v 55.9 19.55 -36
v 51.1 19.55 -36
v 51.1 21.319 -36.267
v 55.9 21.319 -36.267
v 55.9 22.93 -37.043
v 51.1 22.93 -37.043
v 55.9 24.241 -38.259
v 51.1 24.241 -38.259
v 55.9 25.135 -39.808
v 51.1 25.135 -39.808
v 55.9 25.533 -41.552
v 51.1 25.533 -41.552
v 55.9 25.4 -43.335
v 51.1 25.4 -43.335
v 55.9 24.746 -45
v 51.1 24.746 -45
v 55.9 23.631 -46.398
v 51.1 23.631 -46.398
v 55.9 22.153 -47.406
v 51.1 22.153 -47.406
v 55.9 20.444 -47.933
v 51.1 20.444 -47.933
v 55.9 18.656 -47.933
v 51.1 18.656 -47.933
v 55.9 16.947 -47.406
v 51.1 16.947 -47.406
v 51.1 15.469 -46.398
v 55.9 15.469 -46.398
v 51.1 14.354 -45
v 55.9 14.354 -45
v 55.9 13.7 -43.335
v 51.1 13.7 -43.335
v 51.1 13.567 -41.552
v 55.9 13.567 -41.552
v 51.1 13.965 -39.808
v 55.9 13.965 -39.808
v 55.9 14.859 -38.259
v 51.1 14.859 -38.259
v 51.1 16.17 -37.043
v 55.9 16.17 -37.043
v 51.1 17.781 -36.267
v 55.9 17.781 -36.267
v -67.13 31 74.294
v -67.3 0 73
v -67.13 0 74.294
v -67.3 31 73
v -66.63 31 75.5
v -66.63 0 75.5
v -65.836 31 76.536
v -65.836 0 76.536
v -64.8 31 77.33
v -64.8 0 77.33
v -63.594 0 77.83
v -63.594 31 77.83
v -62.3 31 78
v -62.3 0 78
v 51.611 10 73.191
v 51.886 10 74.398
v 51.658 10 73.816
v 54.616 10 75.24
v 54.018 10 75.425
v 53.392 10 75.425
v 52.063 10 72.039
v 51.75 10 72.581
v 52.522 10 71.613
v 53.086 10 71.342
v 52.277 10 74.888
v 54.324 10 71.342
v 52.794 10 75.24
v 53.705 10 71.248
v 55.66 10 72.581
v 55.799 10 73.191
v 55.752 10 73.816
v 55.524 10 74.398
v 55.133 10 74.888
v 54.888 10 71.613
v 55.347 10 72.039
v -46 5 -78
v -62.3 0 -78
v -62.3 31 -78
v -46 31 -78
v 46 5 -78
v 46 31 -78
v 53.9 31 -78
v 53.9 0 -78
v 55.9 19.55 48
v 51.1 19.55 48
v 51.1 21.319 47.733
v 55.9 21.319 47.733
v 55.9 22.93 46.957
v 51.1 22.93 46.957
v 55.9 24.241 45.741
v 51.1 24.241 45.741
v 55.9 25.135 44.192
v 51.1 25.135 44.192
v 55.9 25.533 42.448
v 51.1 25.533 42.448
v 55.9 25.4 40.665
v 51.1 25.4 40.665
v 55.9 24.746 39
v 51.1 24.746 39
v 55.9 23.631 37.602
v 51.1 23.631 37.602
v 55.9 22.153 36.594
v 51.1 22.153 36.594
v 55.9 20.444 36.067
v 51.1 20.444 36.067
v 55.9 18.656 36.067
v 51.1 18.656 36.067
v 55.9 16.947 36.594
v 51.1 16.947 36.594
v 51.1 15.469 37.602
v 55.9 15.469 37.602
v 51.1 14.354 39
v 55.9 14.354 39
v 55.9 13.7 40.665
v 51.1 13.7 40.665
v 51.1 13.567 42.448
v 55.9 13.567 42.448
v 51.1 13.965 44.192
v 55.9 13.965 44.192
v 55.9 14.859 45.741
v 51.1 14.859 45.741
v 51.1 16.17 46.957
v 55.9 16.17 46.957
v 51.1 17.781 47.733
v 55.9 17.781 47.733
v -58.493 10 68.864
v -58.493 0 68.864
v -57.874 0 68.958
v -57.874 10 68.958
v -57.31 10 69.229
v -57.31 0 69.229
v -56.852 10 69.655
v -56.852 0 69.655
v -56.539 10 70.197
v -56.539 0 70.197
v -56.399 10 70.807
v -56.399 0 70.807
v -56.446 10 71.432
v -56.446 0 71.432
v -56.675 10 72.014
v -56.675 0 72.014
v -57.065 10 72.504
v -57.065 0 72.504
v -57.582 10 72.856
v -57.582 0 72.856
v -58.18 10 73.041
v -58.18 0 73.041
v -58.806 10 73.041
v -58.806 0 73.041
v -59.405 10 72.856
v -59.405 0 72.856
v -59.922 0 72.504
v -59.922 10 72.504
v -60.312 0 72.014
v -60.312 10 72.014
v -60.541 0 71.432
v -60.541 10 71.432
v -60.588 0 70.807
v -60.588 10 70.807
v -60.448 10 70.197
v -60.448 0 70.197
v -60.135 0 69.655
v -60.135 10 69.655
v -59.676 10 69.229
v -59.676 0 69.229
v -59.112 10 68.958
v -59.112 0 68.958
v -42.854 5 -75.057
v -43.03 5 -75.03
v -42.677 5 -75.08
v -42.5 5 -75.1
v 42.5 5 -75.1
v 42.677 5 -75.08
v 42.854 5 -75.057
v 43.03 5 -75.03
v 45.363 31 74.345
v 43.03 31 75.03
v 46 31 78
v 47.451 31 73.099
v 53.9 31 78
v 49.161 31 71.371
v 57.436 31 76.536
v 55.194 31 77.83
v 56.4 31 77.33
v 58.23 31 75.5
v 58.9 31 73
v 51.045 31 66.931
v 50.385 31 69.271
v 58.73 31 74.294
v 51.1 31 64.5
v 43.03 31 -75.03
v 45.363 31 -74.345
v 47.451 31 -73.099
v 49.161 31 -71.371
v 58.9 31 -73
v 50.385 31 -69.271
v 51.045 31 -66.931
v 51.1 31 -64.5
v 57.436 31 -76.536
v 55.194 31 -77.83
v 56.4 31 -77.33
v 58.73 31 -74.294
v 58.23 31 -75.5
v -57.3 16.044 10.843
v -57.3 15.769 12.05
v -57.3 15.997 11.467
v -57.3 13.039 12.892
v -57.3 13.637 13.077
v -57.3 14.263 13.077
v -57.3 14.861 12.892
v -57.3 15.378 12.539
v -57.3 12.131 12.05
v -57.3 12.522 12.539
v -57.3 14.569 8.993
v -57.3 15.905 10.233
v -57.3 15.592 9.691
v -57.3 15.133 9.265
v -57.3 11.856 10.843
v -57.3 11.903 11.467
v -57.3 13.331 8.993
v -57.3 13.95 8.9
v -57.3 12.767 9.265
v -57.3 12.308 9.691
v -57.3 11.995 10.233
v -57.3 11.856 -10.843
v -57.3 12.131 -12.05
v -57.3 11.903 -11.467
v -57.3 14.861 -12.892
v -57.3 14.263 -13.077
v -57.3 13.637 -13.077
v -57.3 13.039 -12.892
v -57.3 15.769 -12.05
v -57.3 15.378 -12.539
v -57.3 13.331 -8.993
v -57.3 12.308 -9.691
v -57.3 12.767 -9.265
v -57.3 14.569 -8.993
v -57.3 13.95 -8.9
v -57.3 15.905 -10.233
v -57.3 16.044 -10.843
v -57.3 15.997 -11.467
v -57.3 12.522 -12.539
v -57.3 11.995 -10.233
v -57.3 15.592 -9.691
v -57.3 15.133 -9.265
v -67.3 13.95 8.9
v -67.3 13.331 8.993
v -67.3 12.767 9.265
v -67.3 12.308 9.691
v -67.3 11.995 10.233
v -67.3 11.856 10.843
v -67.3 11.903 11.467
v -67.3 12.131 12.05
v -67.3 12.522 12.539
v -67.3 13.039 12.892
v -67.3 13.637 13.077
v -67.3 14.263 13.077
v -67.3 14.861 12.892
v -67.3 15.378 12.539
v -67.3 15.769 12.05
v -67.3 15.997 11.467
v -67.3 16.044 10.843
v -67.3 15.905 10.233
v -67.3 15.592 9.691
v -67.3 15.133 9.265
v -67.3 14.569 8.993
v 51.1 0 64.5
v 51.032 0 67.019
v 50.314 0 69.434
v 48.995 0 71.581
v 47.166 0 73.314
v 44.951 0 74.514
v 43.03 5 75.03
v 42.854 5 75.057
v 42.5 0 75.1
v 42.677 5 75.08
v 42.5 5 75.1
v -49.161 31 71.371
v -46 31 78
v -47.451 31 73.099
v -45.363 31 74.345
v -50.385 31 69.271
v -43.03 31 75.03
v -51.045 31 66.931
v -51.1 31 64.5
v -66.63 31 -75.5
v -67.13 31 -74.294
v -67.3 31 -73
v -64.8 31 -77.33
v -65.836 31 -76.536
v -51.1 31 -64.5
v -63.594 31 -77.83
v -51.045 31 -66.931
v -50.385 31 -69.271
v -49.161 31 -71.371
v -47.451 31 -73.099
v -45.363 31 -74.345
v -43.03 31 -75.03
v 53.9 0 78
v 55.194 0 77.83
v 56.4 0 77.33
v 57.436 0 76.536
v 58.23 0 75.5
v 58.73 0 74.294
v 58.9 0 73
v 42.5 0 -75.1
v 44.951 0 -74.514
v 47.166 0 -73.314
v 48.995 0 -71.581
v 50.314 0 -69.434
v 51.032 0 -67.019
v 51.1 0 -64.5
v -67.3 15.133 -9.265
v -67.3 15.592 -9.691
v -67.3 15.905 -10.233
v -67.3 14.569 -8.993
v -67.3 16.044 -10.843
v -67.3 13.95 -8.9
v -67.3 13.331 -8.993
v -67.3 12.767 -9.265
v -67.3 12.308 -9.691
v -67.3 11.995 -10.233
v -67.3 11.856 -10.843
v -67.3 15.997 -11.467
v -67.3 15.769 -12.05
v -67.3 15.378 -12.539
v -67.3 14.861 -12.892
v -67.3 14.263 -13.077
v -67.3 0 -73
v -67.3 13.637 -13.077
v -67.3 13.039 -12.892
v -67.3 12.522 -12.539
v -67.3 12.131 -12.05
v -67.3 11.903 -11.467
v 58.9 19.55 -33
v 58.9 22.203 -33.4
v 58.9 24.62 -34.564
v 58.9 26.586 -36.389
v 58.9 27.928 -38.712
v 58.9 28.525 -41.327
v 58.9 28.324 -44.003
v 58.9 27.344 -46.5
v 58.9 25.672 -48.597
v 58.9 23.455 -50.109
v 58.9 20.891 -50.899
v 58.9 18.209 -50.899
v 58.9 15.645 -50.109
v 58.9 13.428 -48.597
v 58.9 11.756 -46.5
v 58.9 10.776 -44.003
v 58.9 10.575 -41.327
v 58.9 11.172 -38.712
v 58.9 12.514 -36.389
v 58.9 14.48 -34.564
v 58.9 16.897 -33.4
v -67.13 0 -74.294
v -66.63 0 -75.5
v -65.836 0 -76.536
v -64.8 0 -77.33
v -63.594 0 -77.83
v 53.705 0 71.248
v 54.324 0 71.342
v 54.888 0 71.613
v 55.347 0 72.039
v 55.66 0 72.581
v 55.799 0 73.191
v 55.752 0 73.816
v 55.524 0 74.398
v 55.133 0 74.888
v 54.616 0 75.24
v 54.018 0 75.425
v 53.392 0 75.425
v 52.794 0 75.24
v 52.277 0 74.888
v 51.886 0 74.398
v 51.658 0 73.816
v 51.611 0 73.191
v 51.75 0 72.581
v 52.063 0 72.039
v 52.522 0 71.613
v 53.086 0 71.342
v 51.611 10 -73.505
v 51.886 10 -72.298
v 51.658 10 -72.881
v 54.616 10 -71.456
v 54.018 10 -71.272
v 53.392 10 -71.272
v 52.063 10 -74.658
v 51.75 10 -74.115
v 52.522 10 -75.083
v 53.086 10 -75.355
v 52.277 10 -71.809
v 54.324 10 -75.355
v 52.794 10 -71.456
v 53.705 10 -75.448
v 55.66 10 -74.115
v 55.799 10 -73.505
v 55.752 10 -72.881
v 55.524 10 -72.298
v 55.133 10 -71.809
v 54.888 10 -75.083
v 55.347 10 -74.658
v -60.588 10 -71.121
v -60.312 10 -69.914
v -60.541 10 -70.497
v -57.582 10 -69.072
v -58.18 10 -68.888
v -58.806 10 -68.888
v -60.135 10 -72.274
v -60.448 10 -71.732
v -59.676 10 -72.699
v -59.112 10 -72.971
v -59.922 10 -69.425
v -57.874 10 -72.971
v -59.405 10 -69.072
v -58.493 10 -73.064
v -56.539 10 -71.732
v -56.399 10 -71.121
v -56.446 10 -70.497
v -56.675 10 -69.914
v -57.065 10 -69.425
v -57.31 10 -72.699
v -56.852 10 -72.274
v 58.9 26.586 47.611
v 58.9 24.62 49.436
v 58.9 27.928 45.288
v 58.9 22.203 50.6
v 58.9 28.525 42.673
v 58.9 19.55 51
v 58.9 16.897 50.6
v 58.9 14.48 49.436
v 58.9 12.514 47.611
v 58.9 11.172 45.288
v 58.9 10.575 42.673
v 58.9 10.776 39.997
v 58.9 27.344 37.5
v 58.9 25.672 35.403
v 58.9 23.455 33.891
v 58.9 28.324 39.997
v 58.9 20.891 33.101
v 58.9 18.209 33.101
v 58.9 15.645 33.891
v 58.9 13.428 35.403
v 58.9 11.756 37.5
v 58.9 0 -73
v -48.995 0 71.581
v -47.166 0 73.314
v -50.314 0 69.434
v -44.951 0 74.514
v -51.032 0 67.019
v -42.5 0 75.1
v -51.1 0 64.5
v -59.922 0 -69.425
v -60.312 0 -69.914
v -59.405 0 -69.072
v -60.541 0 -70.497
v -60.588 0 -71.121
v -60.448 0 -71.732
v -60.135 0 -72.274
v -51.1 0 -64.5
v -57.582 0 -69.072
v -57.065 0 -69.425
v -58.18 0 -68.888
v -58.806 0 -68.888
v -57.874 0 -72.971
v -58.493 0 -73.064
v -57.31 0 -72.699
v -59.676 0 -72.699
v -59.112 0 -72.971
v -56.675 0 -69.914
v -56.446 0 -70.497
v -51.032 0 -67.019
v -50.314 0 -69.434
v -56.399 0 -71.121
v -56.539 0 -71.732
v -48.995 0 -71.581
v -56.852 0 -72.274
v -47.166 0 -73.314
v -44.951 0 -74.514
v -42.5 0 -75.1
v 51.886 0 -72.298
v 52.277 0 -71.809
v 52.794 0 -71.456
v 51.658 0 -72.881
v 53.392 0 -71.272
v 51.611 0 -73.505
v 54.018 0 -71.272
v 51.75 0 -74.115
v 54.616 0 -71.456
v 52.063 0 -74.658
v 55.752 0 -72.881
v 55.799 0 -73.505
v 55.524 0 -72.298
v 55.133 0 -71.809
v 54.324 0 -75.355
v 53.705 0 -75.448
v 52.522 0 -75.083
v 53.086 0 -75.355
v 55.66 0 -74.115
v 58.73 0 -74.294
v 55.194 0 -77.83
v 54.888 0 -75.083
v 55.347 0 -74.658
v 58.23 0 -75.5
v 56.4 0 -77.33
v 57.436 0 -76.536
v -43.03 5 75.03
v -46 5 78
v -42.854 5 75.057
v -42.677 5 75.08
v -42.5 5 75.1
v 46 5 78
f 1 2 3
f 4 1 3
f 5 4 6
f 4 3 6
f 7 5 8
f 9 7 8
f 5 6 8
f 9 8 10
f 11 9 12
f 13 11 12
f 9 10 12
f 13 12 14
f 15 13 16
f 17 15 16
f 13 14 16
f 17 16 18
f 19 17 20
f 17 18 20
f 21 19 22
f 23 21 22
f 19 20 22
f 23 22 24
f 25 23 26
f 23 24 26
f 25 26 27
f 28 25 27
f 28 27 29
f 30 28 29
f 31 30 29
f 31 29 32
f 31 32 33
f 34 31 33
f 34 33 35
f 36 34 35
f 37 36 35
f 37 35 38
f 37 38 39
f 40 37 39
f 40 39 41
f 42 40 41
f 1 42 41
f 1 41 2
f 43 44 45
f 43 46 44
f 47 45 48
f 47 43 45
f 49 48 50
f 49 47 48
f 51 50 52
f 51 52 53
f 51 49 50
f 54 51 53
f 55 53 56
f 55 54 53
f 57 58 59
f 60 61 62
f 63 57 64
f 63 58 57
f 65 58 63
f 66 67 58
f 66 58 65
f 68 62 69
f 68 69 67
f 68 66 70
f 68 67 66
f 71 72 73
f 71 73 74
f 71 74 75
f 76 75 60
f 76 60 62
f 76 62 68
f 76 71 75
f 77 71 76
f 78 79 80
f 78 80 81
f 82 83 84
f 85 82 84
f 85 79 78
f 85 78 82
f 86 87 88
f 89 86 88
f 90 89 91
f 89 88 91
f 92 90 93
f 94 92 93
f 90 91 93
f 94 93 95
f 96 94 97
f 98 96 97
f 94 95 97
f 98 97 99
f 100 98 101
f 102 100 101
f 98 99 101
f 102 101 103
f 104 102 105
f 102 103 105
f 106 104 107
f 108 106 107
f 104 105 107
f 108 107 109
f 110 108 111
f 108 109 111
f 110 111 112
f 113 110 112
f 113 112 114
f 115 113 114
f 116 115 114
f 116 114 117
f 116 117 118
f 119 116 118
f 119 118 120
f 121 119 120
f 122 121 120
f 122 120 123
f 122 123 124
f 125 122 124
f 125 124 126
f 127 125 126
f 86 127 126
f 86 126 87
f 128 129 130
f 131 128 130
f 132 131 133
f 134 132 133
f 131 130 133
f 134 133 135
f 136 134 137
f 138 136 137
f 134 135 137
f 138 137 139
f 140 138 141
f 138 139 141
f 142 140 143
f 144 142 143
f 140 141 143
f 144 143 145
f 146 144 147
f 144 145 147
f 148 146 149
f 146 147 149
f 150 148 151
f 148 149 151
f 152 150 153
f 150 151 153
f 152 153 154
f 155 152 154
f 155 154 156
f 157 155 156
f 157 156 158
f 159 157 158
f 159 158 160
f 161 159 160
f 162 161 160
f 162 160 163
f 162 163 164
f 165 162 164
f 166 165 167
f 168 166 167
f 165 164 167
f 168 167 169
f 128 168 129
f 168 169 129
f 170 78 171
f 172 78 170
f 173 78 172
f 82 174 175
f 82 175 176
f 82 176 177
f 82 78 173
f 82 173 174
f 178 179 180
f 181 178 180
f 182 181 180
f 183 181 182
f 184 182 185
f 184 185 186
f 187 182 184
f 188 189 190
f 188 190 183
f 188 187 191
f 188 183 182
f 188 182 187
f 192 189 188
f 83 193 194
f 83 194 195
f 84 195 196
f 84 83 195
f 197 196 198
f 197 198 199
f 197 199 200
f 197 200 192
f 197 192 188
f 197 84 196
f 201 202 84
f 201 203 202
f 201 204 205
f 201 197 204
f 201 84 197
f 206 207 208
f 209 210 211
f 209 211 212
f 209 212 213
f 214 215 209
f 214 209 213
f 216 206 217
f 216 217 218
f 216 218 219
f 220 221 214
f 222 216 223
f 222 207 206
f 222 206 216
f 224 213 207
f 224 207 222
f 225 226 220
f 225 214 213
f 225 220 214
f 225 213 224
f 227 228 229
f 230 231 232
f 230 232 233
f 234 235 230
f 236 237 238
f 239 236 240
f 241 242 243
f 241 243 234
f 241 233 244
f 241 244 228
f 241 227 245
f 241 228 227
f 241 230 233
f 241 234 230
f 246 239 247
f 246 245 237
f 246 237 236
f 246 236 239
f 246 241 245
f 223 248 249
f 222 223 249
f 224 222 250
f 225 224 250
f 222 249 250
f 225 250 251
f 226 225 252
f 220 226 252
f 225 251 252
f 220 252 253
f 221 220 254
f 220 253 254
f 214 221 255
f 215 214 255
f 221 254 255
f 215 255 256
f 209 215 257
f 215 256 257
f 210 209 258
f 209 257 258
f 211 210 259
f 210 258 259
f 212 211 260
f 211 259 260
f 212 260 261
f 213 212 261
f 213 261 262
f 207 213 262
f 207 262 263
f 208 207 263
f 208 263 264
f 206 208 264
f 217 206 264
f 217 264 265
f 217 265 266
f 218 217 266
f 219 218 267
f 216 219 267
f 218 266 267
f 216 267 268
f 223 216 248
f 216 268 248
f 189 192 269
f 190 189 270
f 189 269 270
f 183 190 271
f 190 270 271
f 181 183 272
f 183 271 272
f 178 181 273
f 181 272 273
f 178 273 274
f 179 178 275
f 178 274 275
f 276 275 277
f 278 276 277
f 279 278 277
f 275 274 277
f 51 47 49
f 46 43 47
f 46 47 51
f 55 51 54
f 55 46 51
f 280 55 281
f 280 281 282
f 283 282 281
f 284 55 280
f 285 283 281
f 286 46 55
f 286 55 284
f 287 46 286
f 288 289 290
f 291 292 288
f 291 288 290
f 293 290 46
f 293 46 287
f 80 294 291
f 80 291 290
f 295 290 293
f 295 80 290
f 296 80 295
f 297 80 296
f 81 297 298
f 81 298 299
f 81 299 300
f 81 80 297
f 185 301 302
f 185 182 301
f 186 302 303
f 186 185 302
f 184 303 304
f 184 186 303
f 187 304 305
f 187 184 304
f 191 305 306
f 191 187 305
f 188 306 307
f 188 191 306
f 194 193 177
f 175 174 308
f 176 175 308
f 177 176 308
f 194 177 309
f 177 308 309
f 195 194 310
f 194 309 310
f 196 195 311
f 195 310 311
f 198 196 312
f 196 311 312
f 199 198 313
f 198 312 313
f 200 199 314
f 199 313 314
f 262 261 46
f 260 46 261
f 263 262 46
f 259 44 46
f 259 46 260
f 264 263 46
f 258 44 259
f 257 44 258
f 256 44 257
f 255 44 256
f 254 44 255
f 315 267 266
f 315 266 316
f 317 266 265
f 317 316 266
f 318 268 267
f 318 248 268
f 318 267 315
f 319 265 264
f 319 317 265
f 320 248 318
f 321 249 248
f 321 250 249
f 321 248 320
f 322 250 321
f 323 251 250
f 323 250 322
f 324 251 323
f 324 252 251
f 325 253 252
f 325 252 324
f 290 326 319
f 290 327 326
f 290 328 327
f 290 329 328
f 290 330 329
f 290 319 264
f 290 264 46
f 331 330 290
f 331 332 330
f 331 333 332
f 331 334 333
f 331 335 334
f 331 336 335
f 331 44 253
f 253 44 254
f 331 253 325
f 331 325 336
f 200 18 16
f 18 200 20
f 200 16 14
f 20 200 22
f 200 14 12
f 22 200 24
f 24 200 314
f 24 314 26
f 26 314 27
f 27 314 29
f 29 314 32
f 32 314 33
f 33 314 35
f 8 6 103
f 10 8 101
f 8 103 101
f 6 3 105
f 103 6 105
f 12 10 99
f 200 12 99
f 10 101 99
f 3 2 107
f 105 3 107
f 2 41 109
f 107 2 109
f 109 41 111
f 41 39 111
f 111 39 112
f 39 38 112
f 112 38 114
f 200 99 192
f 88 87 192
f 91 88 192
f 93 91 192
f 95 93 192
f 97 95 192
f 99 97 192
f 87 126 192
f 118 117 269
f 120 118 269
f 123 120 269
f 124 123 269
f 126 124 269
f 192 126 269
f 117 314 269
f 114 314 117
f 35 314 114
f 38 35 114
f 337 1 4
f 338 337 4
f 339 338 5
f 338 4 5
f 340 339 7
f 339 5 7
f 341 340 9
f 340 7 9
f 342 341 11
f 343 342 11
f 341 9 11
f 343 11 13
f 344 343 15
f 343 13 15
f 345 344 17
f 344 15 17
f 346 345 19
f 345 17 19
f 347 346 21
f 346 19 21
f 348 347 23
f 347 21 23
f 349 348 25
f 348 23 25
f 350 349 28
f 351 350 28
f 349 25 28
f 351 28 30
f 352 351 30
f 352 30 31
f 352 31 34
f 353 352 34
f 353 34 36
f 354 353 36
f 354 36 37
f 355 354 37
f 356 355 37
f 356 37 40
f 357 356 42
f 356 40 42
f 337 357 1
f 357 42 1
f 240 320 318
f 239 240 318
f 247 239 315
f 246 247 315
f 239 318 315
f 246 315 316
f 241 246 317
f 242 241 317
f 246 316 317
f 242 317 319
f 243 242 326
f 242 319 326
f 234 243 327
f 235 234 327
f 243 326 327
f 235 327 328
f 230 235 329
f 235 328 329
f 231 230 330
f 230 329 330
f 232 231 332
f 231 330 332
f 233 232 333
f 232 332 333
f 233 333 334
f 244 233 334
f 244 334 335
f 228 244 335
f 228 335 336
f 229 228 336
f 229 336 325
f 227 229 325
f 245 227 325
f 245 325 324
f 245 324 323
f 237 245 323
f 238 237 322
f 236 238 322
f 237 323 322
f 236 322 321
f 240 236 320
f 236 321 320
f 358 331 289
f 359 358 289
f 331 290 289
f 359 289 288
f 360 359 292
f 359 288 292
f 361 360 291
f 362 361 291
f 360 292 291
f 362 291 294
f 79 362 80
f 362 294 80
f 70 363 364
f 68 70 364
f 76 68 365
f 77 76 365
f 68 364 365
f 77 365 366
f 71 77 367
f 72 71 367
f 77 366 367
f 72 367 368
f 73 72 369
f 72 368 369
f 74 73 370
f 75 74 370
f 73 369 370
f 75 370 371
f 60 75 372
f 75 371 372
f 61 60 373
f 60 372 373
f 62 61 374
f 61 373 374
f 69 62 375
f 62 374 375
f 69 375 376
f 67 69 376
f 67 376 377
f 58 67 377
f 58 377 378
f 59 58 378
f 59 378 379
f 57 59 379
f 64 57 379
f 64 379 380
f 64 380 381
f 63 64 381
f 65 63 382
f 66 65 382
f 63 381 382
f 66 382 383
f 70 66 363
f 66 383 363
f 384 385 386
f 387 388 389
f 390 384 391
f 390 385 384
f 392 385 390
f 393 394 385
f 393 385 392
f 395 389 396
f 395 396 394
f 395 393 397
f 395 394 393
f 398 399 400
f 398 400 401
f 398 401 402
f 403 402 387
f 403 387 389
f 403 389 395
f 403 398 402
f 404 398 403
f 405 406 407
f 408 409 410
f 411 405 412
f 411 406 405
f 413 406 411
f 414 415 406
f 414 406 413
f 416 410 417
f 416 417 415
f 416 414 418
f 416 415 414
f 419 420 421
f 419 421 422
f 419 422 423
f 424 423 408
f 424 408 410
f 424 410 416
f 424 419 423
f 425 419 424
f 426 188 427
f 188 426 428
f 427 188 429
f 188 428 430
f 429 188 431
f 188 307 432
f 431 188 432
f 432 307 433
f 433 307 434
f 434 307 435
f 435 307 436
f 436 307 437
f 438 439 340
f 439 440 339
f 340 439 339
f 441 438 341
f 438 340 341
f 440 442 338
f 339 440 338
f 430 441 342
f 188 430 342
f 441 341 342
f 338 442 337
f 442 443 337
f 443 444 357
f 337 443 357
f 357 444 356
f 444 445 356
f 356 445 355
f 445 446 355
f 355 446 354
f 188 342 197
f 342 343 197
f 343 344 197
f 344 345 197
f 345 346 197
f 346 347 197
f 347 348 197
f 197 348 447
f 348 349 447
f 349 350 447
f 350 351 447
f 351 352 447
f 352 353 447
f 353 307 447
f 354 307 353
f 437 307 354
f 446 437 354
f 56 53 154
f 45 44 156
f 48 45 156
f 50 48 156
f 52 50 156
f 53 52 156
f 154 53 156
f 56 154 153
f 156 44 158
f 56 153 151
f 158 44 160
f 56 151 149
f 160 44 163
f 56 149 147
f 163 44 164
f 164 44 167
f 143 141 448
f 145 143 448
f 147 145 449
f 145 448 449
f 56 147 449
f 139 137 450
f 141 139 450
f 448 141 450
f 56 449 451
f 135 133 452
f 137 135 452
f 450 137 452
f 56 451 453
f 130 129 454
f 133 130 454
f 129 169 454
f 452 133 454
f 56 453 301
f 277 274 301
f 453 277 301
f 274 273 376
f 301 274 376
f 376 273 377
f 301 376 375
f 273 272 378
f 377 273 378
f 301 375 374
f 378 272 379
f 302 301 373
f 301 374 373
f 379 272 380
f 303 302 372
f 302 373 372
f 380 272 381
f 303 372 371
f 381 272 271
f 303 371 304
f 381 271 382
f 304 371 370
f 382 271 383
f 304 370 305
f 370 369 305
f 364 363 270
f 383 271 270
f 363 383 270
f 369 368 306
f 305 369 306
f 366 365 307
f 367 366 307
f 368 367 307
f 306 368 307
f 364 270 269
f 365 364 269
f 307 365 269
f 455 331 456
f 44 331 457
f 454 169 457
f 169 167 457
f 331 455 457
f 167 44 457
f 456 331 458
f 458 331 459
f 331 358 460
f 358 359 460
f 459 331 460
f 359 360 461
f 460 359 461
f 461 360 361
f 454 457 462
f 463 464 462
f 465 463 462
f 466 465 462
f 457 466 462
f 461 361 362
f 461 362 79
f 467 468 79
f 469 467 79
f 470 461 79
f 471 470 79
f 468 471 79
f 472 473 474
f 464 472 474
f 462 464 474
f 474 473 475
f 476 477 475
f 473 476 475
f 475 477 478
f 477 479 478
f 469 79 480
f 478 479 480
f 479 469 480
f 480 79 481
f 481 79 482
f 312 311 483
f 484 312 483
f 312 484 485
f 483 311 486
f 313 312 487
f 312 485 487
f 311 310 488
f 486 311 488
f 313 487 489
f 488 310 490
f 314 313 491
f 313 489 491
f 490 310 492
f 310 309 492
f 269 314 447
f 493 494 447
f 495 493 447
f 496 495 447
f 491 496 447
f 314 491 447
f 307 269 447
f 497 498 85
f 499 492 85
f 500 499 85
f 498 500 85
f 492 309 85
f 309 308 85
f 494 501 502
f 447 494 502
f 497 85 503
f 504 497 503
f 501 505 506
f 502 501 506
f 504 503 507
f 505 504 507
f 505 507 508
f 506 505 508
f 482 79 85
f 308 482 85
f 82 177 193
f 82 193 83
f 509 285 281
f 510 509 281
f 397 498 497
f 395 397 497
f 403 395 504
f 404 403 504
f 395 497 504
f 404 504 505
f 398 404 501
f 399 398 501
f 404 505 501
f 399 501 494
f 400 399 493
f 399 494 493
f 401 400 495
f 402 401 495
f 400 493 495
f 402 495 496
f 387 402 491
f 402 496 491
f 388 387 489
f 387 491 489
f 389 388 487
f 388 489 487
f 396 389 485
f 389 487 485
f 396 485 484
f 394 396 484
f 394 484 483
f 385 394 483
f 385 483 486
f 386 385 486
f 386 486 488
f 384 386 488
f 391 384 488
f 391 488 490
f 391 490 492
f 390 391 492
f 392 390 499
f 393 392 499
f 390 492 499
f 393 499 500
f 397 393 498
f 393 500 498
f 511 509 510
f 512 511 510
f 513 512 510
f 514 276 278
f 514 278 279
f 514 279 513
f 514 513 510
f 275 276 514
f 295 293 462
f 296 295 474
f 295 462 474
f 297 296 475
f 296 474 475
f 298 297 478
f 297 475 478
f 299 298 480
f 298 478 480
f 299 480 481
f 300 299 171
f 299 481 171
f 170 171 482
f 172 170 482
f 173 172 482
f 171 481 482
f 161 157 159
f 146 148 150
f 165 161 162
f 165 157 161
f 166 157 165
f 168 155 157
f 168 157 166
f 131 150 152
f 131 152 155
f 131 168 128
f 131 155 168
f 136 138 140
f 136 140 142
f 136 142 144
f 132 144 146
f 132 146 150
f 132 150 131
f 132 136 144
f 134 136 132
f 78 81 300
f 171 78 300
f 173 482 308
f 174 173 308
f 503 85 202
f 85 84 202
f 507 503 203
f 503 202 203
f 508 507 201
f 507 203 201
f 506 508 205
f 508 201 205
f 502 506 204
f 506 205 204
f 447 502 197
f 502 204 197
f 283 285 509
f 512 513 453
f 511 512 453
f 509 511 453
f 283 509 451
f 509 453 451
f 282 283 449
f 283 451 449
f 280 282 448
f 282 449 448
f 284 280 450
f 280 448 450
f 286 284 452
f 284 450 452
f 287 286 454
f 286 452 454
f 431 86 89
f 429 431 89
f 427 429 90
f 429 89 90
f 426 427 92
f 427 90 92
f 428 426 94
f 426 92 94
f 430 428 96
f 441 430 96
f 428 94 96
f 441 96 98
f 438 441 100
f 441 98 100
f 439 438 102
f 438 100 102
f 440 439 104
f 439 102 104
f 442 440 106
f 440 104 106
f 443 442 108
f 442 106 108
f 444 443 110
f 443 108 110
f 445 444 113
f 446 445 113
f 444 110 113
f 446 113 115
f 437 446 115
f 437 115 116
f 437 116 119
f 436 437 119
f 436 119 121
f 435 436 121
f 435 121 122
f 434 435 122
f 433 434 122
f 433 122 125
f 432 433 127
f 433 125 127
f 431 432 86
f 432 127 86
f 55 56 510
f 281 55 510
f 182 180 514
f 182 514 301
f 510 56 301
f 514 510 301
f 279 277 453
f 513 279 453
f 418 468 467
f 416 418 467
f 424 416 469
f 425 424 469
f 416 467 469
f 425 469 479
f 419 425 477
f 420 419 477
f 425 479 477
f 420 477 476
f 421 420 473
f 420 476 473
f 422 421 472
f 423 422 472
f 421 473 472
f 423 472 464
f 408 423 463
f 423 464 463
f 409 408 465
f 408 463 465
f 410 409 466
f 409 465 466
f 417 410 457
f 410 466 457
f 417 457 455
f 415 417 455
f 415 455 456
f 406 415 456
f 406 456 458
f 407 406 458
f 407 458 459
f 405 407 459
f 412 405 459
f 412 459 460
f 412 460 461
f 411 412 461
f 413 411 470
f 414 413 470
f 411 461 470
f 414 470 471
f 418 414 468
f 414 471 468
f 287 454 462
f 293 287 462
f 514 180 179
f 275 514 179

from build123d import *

# Parameters (mm, degrees)
SKETCH_1_W          = 126.2
SKETCH_1_H          = 156
EXTRUDE_1_DEPTH     = 31
CUT_EXTRUDE_START   = -26
CUT_EXTRUDE_1_DEPTH = 26
FILLET_1_R          = 5
F_12_0MM_1_D        = 12
F_12_0MM_1_DEPTH    = 17
F_12_0MM_1_TIP      = 3.605163714
SKETCH_6_R          = 2.1
CUT_EXTRUDE_2_DEPTH = 10
SKETCH_7_R          = 2.1
CUT_EXTRUDE_3_DEPTH = 10
CHAMFER_1_SIZE      = 3


with BuildPart() as part:
    # 草图1 → 凸台-拉伸1 (new body)
    with BuildSketch(Plane(origin=(0, 0, 0), x_dir=(1, 0, 0), z_dir=(0, 1, 0))):
        with Locations((-4.2, 0)):
            Rectangle(SKETCH_1_W, SKETCH_1_H)
        with BuildLine():
            Line((-42.5, 75.1), (42.5, 75.1))
            ThreePointArc((42.5, 75.1), (48.995331881, 71.581118318), (51.1, 64.5))
            Line((51.1, 64.5), (51.1, -64.5))
            ThreePointArc((51.1, -64.5), (48.995331881, -71.581118318), (42.5, -75.1))
            Line((42.5, -75.1), (-42.5, -75.1))
            ThreePointArc((-42.5, -75.1), (-48.995331881, -71.581118318), (-51.1, -64.5))
            Line((-51.1, -64.5), (-51.1, 64.5))
            ThreePointArc((-51.1, 64.5), (-48.995331881, 71.581118318), (-42.5, 75.1))
        make_face(mode=Mode.SUBTRACT)
    extrude(amount=EXTRUDE_1_DEPTH)

    # 草图2 → 切除-拉伸1 (cut)
    with BuildSketch(Plane(origin=(0, 31, 0), x_dir=(1, 0, 0), z_dir=(0, 1, 0)).offset(CUT_EXTRUDE_START)):
        with BuildLine():
            Line((-42.780928277, -74.780928277), (-43.029918625, -75.029918625))
            ThreePointArc((-43.029918625, -75.029918625), (-42.765444551, -75.068628433), (-42.5, -75.1))
            Line((-42.5, -75.1), (-42.780928277, -74.780928277))
        make_face()
        with BuildLine():
            Line((-43.029918625, -75.029918625), (-43.1, -75.1))
            Line((-43.1, -75.1), (-42.5, -75.1))
            ThreePointArc((-42.5, -75.1), (-42.765444551, -75.068628433), (-43.029918625, -75.029918625))
        make_face()
        Polygon((43.1, -75.1), (42.5, -75.1), (-42.5, -75.1), (-43.1, -75.1), (-46, -78), (46, -78), align=None)
        with BuildLine():
            ThreePointArc((42.5, -75.1), (42.765444551, -75.068628433), (43.029918625, -75.029918625))
            Line((43.029918625, -75.029918625), (42.872377268, -74.872377268))
            Line((42.872377268, -74.872377268), (42.5, -75.1))
        make_face()
        with BuildLine():
            Line((42.5, -75.1), (43.1, -75.1))
            Line((43.1, -75.1), (43.029918625, -75.029918625))
            ThreePointArc((43.029918625, -75.029918625), (42.765444551, -75.068628433), (42.5, -75.1))
        make_face()
        Polygon((46, 78), (-46, 78), (-43.1, 75.1), (-42.5, 75.1), (42.5, 75.1), (43.1, 75.1), align=None)
        with BuildLine():
            Line((-42.780928277, 74.780928277), (-42.5, 75.1))
            ThreePointArc((-42.5, 75.1), (-42.765444551, 75.068628433), (-43.029918625, 75.029918625))
            Line((-43.029918625, 75.029918625), (-42.780928277, 74.780928277))
        make_face()
        with BuildLine():
            Line((-42.5, 75.1), (-43.1, 75.1))
            Line((-43.1, 75.1), (-43.029918625, 75.029918625))
            ThreePointArc((-43.029918625, 75.029918625), (-42.765444551, 75.068628433), (-42.5, 75.1))
        make_face()
        with BuildLine():
            ThreePointArc((43.029918625, 75.029918625), (42.765444551, 75.068628433), (42.5, 75.1))
            Line((42.5, 75.1), (42.872377268, 74.872377268))
            Line((42.872377268, 74.872377268), (43.029918625, 75.029918625))
        make_face()
        with BuildLine():
            Line((43.029918625, 75.029918625), (43.1, 75.1))
            Line((43.1, 75.1), (42.5, 75.1))
            ThreePointArc((42.5, 75.1), (42.765444551, 75.068628433), (43.029918625, 75.029918625))
        make_face()
    extrude(amount=CUT_EXTRUDE_1_DEPTH, mode=Mode.SUBTRACT)

    # 圆角1
    fillet_1_edges = [part.edges().sort_by_distance(p)[0] for p in [
        (58.9, 15.5, -78),
        (58.9, 15.5, 78),
        (-67.3, 15.5, 78),
        (-67.3, 15.5, -78),
    ]]
    fillet(fillet_1_edges, radius=FILLET_1_R)

    # Ø12.0mm 暗销孔1
    with Locations(Plane(origin=(58.9, 0, 0), x_dir=(0, 0, -1), z_dir=(1, 0, 0))):
        with Locations((42, 19.55), (-42, 19.55)):
            Hole(F_12_0MM_1_D / 2, depth=F_12_0MM_1_DEPTH)
            with Locations((0, 0, -(F_12_0MM_1_DEPTH + F_12_0MM_1_TIP / 2))):  # 118° drill point
                Cone(0, F_12_0MM_1_D / 2, F_12_0MM_1_TIP, mode=Mode.SUBTRACT)

    # 草图6 → 切除-拉伸2 (cut)
    with BuildSketch(Plane.ZY.offset(67.3)):
        with Locations((-11, 13.95)):
            Circle(SKETCH_6_R)
        with Locations(Location((11, 13.95, 0), (0, 0, 180))):
            Circle(SKETCH_6_R)
    extrude(amount=-CUT_EXTRUDE_2_DEPTH, mode=Mode.SUBTRACT)

    # 草图7 → 切除-拉伸3 (cut)
    with BuildSketch(Plane.XZ):
        with Locations(Location((-58.493442579, 70.964337058, 0), (0, 0, 270))):
            Circle(SKETCH_7_R)
        with Locations(Location((53.705008218, 73.348219362, 0), (0, 0, 270))):
            Circle(SKETCH_7_R)
        with Locations(Location((-58.493442579, -70.964337058, 0), (0, 0, 270))):
            Circle(SKETCH_7_R)
        with Locations(Location((53.705008218, -73.348219362, 0), (0, 0, 270))):
            Circle(SKETCH_7_R)
    extrude(amount=-CUT_EXTRUDE_3_DEPTH, mode=Mode.SUBTRACT)

    # 倒角1
    chamfer_1_edges = [part.edges().sort_by_distance(p)[0] for p in [
        (58.9, 19.55, 36),
        (58.9, 19.55, -48),
    ]]
    chamfer(chamfer_1_edges, length=CHAMFER_1_SIZE)


solid = part.part
